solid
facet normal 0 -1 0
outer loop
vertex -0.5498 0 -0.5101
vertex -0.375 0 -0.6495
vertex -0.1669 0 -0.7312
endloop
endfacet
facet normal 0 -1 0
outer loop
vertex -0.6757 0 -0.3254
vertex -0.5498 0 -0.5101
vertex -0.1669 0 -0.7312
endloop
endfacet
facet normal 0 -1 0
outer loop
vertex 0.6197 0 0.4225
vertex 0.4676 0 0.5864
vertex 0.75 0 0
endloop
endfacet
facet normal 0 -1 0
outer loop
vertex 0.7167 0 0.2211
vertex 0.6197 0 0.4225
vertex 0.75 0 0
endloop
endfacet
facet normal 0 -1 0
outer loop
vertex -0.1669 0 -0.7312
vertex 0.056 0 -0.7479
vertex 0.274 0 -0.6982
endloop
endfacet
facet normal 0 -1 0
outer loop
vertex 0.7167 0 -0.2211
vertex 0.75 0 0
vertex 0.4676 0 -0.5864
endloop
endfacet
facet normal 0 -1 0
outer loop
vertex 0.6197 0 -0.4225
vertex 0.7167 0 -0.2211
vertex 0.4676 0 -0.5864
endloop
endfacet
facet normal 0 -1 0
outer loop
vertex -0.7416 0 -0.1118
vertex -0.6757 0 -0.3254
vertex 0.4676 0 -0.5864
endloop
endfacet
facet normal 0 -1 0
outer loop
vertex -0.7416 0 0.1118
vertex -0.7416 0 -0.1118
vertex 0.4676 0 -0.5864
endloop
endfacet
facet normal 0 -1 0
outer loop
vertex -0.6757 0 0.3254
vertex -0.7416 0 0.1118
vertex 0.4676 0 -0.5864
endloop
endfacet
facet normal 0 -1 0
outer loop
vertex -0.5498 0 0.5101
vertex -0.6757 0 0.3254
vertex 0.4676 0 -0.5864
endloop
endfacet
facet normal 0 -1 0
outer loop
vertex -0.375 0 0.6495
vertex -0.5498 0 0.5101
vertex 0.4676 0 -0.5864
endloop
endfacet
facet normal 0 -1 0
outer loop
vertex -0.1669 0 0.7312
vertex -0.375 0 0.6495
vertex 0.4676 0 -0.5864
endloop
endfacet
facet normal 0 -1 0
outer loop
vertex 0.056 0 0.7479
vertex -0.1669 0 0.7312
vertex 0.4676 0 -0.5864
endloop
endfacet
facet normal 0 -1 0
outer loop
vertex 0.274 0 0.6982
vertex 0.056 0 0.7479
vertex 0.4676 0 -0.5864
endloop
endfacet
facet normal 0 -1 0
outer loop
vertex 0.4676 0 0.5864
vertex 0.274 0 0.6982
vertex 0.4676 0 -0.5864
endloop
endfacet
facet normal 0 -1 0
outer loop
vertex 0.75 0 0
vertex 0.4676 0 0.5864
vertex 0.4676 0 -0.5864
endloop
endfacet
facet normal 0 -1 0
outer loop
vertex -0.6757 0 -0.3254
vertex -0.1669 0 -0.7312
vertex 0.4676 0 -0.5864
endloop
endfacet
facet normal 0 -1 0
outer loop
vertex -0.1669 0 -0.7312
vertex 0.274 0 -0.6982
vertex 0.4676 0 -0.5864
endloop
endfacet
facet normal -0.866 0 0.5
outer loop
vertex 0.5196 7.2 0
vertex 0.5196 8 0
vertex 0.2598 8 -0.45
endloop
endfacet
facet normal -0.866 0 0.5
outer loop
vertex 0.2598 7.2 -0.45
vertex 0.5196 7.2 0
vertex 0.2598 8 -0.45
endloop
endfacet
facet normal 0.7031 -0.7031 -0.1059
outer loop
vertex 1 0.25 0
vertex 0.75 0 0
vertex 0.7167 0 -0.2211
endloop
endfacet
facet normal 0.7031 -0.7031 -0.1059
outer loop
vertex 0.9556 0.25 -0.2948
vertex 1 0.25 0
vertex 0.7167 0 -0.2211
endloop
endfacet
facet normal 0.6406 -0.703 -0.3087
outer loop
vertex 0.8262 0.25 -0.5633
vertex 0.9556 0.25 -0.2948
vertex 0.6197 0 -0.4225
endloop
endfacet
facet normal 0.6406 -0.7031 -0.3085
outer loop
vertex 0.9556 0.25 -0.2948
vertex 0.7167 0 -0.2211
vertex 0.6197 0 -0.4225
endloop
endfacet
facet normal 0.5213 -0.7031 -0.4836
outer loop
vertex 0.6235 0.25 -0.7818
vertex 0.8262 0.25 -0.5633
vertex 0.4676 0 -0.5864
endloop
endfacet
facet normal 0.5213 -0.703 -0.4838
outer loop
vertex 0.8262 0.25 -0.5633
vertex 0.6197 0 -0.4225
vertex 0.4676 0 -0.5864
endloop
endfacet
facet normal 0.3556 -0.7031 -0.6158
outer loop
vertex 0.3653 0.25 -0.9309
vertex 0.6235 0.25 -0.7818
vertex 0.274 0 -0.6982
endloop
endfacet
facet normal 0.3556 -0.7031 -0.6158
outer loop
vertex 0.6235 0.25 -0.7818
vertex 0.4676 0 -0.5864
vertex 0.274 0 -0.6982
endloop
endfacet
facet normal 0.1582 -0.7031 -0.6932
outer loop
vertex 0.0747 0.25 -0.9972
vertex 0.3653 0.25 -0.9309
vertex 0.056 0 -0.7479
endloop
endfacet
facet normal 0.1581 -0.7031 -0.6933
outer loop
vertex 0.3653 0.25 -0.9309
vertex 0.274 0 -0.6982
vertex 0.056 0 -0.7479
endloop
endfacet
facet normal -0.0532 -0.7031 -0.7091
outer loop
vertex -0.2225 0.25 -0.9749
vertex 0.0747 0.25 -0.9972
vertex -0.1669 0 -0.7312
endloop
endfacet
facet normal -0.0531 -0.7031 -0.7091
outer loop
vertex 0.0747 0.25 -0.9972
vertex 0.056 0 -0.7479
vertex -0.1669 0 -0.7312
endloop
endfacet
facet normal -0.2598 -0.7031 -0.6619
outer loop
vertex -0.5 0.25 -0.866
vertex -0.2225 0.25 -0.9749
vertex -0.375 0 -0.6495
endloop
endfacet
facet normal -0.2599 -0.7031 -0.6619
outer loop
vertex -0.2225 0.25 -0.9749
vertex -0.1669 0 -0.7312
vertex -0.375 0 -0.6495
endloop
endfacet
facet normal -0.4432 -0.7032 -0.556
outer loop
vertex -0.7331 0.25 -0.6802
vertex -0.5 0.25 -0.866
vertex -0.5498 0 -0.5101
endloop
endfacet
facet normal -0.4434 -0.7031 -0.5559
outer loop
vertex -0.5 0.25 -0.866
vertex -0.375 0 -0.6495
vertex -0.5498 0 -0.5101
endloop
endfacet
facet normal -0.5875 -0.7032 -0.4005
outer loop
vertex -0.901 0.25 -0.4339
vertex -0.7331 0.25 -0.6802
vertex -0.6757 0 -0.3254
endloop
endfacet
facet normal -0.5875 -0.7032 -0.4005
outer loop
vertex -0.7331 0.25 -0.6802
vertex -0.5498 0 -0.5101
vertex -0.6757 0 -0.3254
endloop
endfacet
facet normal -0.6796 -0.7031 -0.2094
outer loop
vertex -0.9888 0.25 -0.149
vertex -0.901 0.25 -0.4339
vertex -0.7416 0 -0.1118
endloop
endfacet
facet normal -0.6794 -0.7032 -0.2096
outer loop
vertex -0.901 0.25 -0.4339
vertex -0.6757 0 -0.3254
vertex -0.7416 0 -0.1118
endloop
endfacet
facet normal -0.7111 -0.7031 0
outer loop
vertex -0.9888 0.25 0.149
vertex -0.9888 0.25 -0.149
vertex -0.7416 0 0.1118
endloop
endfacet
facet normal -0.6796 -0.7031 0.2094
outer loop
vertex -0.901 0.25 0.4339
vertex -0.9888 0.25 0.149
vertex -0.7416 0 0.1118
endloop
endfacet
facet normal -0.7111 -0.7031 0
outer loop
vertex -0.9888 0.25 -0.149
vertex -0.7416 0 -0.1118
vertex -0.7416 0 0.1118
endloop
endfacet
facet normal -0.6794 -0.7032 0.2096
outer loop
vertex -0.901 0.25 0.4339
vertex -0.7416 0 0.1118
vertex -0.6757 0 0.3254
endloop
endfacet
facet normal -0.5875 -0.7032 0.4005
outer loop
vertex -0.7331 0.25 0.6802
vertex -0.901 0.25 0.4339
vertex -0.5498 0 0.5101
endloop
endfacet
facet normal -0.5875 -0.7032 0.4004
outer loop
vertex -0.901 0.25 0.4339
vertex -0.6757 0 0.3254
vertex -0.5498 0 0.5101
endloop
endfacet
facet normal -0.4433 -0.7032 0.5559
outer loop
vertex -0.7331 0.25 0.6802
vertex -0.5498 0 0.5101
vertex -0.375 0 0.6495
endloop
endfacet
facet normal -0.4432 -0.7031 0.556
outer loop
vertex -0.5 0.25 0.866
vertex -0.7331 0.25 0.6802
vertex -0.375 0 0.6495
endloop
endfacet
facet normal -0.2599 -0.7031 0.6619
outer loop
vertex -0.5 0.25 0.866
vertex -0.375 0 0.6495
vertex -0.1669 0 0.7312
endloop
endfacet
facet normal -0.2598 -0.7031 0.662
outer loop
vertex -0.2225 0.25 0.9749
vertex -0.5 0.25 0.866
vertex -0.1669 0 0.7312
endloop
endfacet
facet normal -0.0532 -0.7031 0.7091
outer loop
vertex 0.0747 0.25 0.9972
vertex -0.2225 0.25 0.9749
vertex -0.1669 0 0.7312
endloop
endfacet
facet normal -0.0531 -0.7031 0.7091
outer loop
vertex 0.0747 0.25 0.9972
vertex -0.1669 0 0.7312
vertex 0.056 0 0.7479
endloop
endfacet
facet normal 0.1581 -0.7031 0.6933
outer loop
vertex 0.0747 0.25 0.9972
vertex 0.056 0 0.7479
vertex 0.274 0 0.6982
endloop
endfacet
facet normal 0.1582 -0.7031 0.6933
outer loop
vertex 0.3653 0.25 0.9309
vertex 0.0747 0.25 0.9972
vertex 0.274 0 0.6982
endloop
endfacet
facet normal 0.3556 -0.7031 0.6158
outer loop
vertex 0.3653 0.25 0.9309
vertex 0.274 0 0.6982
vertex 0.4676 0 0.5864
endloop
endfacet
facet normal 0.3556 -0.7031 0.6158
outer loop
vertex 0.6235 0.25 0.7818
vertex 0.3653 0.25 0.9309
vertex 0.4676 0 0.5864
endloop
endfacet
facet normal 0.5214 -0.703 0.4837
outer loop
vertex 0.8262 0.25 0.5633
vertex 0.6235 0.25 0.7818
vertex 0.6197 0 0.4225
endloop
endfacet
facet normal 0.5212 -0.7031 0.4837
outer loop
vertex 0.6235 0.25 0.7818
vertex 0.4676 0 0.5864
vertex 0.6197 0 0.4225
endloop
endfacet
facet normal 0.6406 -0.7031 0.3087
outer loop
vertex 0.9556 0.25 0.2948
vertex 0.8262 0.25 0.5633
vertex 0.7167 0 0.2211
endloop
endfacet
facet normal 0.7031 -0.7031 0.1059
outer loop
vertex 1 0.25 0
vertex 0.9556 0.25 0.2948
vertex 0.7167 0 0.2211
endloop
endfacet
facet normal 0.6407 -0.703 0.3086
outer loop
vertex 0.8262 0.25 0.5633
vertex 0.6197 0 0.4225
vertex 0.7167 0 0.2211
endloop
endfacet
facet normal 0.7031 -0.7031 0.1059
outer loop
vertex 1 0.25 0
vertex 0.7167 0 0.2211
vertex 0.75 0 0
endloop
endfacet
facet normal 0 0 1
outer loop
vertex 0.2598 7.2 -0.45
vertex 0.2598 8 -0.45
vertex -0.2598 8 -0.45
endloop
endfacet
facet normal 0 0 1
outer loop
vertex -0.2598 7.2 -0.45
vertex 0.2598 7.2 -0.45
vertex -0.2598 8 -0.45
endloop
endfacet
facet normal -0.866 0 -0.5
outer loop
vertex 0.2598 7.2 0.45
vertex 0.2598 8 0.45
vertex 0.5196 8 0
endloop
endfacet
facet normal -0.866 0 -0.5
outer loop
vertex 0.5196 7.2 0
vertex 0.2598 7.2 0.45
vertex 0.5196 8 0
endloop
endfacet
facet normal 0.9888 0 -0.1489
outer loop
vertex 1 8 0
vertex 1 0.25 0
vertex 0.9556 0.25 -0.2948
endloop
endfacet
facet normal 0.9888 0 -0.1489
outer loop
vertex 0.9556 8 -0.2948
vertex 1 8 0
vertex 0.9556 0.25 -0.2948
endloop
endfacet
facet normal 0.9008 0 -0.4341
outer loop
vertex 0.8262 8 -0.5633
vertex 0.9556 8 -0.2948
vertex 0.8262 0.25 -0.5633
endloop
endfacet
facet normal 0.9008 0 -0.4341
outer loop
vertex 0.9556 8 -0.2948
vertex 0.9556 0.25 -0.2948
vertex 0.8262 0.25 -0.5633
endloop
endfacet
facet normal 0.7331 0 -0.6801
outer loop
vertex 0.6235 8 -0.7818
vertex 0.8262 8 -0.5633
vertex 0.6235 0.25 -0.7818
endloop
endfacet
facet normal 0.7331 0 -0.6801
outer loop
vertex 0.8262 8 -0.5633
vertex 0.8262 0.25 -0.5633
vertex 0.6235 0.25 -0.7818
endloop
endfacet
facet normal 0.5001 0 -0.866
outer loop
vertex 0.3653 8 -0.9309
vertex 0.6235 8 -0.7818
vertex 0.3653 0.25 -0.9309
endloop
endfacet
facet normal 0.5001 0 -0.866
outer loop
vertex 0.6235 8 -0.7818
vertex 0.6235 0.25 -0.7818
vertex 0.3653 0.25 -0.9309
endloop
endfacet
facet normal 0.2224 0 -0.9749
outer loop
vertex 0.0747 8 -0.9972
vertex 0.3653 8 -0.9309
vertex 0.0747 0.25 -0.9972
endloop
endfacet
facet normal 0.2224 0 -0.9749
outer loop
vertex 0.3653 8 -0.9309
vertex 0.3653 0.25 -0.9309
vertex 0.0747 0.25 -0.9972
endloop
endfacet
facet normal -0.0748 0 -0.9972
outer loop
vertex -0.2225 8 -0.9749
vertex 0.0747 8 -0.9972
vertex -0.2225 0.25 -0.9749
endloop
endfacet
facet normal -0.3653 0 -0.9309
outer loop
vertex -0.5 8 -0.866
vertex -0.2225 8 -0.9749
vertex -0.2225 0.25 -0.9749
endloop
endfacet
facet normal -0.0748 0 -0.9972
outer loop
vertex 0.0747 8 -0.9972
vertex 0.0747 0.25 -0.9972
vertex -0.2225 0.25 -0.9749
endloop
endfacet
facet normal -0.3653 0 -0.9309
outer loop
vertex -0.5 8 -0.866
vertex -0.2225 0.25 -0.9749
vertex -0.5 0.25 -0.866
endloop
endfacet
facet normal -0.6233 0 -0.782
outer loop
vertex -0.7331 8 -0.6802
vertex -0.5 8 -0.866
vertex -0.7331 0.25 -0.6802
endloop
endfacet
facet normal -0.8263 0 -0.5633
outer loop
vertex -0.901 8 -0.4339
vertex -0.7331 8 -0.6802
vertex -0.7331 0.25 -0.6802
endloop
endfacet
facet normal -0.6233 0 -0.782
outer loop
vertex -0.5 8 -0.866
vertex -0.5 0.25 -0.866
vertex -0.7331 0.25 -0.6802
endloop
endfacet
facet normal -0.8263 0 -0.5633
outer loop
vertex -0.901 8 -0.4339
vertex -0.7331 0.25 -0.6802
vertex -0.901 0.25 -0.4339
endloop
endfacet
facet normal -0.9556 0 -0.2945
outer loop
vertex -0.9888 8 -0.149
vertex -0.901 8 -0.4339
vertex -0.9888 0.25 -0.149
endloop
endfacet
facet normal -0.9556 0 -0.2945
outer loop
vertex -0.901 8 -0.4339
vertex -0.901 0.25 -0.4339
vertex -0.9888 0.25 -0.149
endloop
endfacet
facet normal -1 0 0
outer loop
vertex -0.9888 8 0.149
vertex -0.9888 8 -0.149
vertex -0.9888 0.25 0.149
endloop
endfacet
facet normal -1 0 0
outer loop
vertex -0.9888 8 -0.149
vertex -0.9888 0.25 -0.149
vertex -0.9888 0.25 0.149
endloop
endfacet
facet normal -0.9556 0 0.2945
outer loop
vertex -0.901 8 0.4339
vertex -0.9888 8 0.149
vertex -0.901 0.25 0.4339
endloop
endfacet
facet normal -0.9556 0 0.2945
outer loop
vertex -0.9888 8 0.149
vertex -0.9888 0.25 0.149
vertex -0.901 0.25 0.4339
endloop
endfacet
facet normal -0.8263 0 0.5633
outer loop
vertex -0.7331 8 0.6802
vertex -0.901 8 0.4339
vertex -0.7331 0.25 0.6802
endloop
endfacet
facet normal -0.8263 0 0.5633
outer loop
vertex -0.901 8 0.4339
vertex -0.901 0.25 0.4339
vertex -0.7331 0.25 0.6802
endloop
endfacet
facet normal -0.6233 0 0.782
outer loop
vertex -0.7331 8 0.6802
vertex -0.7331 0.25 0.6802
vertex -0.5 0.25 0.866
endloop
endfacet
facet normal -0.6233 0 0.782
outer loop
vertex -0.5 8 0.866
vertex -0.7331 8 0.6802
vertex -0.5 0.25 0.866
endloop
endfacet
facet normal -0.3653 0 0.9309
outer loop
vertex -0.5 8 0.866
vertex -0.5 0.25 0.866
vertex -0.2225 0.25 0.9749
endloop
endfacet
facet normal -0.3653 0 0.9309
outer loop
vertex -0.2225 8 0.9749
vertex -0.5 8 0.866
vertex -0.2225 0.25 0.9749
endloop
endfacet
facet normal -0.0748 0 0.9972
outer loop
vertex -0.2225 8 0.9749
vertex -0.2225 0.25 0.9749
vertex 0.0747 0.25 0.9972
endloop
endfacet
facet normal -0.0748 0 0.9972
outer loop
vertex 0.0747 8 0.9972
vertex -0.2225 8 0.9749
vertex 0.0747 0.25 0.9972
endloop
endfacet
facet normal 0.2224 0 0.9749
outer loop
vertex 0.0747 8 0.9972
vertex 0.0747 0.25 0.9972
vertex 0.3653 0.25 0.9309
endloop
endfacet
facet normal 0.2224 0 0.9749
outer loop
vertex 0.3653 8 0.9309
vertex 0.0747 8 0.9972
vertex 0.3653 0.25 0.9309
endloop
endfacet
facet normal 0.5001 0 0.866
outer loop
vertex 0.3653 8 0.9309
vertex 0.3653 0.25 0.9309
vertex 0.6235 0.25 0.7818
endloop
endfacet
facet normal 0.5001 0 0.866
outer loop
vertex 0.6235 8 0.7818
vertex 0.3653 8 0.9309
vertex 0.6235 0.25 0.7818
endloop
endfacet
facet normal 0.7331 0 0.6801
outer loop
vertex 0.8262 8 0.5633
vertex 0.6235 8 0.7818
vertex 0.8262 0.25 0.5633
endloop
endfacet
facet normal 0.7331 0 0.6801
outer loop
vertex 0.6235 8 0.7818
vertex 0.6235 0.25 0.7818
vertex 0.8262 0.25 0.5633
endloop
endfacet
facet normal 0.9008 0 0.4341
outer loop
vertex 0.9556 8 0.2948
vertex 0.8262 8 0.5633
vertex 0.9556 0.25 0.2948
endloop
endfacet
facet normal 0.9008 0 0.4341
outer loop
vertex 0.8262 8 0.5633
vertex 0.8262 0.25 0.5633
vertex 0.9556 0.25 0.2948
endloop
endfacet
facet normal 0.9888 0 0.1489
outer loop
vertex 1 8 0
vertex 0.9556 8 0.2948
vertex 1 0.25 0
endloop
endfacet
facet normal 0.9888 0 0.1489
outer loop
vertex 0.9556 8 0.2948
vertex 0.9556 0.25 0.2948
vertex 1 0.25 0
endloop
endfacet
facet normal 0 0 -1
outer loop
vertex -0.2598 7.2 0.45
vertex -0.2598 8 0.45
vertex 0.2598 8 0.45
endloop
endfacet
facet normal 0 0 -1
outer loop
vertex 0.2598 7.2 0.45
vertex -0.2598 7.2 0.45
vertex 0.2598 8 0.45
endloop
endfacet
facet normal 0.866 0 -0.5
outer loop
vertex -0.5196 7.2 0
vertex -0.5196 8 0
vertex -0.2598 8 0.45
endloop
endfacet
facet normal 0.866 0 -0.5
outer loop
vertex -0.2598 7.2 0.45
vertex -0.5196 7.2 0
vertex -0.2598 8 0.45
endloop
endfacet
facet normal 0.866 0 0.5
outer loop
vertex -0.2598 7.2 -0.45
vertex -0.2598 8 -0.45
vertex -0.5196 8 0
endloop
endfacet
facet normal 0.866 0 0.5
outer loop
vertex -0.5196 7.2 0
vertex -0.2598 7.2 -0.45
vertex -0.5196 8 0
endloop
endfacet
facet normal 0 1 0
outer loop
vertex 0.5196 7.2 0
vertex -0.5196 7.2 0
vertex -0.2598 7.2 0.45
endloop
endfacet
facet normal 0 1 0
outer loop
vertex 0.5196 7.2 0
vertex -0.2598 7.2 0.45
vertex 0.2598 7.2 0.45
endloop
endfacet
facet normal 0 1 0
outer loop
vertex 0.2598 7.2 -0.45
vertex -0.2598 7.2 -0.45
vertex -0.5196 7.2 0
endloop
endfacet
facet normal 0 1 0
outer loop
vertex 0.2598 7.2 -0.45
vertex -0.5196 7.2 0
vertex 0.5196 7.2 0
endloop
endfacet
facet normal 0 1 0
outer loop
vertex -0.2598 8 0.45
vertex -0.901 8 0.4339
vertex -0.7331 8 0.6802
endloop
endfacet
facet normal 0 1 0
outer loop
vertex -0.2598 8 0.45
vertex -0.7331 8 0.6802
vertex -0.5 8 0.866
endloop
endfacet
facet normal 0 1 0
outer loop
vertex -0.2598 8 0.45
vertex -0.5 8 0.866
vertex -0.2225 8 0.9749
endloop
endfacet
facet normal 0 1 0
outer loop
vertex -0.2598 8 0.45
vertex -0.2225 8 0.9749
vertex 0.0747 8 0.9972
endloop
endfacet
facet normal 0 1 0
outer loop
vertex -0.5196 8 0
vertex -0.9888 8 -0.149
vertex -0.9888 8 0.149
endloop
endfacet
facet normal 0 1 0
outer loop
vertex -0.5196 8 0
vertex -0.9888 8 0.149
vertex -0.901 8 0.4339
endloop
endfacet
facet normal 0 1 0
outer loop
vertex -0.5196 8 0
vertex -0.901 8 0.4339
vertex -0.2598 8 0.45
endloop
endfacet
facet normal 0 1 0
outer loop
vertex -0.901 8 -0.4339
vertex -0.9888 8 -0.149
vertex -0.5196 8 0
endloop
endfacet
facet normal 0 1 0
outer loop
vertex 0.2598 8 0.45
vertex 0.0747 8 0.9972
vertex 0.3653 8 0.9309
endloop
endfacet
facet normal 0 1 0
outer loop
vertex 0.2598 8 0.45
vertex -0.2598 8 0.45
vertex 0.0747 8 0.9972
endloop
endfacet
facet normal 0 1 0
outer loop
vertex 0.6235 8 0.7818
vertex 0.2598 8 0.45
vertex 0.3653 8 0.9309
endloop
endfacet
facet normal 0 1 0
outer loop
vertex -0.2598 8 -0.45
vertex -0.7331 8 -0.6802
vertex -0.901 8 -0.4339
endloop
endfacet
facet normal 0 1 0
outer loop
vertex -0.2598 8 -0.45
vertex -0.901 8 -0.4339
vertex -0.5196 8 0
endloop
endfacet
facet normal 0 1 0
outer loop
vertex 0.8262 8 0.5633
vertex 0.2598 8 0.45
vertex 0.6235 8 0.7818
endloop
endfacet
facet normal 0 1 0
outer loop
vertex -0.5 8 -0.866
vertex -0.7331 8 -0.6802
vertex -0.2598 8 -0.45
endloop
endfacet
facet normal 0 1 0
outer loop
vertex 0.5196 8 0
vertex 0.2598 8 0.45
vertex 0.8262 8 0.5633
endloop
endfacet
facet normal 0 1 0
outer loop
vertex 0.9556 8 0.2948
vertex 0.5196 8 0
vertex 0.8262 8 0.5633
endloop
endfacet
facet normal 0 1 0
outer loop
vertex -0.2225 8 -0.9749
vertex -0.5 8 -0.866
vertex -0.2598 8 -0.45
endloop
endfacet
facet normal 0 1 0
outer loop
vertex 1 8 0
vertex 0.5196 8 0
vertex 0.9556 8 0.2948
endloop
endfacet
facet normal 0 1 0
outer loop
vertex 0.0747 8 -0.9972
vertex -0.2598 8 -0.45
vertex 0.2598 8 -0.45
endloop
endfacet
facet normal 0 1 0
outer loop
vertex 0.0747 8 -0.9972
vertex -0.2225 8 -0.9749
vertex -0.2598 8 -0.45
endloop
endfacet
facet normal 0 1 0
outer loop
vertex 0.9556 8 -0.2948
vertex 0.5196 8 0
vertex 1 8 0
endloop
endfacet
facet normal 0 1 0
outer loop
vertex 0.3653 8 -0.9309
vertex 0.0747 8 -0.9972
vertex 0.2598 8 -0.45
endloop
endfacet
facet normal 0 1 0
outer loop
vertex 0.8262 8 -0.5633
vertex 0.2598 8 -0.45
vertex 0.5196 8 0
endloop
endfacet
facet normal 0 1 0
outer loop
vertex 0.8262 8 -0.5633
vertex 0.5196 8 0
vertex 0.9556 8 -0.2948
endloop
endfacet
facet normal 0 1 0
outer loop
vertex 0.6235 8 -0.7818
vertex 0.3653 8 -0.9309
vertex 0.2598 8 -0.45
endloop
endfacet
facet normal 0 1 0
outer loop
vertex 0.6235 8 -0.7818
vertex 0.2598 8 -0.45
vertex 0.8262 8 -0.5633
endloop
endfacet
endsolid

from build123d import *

# Parameters (mm, degrees)
SKETCH1_R           = 1
BOSS_EXTRUDE1_DEPTH = 8
CHAMFER1_SIZE       = 0.25
CUT_EXTRUDE1_DEPTH  = 0.8


with BuildPart() as part:
    # Sketch1 → Boss-Extrude1 (new body)
    with BuildSketch(Plane(origin=(0, 0, 0), x_dir=(1, 0, 0), z_dir=(0, 1, 0))):
        Circle(SKETCH1_R)
    extrude(amount=BOSS_EXTRUDE1_DEPTH)

    # Chamfer1
    chamfer1_edges = [part.edges().sort_by_distance(p)[0] for p in [
        (-1, 0, 0),
    ]]
    chamfer(chamfer1_edges, length=CHAMFER1_SIZE)

    # Sketch2 → Cut-Extrude1 (cut)
    with BuildSketch(Plane(origin=(0, 8, 0), x_dir=(1, 0, 0), z_dir=(0, 1, 0))):
        Polygon((0.259807621, -0.45), (0.519615242, 0), (0.259807621, 0.45), (-0.259807621, 0.45), (-0.519615242, 0), (-0.259807621, -0.45), align=None)
    extrude(amount=-CUT_EXTRUDE1_DEPTH, mode=Mode.SUBTRACT)


solid = part.part
